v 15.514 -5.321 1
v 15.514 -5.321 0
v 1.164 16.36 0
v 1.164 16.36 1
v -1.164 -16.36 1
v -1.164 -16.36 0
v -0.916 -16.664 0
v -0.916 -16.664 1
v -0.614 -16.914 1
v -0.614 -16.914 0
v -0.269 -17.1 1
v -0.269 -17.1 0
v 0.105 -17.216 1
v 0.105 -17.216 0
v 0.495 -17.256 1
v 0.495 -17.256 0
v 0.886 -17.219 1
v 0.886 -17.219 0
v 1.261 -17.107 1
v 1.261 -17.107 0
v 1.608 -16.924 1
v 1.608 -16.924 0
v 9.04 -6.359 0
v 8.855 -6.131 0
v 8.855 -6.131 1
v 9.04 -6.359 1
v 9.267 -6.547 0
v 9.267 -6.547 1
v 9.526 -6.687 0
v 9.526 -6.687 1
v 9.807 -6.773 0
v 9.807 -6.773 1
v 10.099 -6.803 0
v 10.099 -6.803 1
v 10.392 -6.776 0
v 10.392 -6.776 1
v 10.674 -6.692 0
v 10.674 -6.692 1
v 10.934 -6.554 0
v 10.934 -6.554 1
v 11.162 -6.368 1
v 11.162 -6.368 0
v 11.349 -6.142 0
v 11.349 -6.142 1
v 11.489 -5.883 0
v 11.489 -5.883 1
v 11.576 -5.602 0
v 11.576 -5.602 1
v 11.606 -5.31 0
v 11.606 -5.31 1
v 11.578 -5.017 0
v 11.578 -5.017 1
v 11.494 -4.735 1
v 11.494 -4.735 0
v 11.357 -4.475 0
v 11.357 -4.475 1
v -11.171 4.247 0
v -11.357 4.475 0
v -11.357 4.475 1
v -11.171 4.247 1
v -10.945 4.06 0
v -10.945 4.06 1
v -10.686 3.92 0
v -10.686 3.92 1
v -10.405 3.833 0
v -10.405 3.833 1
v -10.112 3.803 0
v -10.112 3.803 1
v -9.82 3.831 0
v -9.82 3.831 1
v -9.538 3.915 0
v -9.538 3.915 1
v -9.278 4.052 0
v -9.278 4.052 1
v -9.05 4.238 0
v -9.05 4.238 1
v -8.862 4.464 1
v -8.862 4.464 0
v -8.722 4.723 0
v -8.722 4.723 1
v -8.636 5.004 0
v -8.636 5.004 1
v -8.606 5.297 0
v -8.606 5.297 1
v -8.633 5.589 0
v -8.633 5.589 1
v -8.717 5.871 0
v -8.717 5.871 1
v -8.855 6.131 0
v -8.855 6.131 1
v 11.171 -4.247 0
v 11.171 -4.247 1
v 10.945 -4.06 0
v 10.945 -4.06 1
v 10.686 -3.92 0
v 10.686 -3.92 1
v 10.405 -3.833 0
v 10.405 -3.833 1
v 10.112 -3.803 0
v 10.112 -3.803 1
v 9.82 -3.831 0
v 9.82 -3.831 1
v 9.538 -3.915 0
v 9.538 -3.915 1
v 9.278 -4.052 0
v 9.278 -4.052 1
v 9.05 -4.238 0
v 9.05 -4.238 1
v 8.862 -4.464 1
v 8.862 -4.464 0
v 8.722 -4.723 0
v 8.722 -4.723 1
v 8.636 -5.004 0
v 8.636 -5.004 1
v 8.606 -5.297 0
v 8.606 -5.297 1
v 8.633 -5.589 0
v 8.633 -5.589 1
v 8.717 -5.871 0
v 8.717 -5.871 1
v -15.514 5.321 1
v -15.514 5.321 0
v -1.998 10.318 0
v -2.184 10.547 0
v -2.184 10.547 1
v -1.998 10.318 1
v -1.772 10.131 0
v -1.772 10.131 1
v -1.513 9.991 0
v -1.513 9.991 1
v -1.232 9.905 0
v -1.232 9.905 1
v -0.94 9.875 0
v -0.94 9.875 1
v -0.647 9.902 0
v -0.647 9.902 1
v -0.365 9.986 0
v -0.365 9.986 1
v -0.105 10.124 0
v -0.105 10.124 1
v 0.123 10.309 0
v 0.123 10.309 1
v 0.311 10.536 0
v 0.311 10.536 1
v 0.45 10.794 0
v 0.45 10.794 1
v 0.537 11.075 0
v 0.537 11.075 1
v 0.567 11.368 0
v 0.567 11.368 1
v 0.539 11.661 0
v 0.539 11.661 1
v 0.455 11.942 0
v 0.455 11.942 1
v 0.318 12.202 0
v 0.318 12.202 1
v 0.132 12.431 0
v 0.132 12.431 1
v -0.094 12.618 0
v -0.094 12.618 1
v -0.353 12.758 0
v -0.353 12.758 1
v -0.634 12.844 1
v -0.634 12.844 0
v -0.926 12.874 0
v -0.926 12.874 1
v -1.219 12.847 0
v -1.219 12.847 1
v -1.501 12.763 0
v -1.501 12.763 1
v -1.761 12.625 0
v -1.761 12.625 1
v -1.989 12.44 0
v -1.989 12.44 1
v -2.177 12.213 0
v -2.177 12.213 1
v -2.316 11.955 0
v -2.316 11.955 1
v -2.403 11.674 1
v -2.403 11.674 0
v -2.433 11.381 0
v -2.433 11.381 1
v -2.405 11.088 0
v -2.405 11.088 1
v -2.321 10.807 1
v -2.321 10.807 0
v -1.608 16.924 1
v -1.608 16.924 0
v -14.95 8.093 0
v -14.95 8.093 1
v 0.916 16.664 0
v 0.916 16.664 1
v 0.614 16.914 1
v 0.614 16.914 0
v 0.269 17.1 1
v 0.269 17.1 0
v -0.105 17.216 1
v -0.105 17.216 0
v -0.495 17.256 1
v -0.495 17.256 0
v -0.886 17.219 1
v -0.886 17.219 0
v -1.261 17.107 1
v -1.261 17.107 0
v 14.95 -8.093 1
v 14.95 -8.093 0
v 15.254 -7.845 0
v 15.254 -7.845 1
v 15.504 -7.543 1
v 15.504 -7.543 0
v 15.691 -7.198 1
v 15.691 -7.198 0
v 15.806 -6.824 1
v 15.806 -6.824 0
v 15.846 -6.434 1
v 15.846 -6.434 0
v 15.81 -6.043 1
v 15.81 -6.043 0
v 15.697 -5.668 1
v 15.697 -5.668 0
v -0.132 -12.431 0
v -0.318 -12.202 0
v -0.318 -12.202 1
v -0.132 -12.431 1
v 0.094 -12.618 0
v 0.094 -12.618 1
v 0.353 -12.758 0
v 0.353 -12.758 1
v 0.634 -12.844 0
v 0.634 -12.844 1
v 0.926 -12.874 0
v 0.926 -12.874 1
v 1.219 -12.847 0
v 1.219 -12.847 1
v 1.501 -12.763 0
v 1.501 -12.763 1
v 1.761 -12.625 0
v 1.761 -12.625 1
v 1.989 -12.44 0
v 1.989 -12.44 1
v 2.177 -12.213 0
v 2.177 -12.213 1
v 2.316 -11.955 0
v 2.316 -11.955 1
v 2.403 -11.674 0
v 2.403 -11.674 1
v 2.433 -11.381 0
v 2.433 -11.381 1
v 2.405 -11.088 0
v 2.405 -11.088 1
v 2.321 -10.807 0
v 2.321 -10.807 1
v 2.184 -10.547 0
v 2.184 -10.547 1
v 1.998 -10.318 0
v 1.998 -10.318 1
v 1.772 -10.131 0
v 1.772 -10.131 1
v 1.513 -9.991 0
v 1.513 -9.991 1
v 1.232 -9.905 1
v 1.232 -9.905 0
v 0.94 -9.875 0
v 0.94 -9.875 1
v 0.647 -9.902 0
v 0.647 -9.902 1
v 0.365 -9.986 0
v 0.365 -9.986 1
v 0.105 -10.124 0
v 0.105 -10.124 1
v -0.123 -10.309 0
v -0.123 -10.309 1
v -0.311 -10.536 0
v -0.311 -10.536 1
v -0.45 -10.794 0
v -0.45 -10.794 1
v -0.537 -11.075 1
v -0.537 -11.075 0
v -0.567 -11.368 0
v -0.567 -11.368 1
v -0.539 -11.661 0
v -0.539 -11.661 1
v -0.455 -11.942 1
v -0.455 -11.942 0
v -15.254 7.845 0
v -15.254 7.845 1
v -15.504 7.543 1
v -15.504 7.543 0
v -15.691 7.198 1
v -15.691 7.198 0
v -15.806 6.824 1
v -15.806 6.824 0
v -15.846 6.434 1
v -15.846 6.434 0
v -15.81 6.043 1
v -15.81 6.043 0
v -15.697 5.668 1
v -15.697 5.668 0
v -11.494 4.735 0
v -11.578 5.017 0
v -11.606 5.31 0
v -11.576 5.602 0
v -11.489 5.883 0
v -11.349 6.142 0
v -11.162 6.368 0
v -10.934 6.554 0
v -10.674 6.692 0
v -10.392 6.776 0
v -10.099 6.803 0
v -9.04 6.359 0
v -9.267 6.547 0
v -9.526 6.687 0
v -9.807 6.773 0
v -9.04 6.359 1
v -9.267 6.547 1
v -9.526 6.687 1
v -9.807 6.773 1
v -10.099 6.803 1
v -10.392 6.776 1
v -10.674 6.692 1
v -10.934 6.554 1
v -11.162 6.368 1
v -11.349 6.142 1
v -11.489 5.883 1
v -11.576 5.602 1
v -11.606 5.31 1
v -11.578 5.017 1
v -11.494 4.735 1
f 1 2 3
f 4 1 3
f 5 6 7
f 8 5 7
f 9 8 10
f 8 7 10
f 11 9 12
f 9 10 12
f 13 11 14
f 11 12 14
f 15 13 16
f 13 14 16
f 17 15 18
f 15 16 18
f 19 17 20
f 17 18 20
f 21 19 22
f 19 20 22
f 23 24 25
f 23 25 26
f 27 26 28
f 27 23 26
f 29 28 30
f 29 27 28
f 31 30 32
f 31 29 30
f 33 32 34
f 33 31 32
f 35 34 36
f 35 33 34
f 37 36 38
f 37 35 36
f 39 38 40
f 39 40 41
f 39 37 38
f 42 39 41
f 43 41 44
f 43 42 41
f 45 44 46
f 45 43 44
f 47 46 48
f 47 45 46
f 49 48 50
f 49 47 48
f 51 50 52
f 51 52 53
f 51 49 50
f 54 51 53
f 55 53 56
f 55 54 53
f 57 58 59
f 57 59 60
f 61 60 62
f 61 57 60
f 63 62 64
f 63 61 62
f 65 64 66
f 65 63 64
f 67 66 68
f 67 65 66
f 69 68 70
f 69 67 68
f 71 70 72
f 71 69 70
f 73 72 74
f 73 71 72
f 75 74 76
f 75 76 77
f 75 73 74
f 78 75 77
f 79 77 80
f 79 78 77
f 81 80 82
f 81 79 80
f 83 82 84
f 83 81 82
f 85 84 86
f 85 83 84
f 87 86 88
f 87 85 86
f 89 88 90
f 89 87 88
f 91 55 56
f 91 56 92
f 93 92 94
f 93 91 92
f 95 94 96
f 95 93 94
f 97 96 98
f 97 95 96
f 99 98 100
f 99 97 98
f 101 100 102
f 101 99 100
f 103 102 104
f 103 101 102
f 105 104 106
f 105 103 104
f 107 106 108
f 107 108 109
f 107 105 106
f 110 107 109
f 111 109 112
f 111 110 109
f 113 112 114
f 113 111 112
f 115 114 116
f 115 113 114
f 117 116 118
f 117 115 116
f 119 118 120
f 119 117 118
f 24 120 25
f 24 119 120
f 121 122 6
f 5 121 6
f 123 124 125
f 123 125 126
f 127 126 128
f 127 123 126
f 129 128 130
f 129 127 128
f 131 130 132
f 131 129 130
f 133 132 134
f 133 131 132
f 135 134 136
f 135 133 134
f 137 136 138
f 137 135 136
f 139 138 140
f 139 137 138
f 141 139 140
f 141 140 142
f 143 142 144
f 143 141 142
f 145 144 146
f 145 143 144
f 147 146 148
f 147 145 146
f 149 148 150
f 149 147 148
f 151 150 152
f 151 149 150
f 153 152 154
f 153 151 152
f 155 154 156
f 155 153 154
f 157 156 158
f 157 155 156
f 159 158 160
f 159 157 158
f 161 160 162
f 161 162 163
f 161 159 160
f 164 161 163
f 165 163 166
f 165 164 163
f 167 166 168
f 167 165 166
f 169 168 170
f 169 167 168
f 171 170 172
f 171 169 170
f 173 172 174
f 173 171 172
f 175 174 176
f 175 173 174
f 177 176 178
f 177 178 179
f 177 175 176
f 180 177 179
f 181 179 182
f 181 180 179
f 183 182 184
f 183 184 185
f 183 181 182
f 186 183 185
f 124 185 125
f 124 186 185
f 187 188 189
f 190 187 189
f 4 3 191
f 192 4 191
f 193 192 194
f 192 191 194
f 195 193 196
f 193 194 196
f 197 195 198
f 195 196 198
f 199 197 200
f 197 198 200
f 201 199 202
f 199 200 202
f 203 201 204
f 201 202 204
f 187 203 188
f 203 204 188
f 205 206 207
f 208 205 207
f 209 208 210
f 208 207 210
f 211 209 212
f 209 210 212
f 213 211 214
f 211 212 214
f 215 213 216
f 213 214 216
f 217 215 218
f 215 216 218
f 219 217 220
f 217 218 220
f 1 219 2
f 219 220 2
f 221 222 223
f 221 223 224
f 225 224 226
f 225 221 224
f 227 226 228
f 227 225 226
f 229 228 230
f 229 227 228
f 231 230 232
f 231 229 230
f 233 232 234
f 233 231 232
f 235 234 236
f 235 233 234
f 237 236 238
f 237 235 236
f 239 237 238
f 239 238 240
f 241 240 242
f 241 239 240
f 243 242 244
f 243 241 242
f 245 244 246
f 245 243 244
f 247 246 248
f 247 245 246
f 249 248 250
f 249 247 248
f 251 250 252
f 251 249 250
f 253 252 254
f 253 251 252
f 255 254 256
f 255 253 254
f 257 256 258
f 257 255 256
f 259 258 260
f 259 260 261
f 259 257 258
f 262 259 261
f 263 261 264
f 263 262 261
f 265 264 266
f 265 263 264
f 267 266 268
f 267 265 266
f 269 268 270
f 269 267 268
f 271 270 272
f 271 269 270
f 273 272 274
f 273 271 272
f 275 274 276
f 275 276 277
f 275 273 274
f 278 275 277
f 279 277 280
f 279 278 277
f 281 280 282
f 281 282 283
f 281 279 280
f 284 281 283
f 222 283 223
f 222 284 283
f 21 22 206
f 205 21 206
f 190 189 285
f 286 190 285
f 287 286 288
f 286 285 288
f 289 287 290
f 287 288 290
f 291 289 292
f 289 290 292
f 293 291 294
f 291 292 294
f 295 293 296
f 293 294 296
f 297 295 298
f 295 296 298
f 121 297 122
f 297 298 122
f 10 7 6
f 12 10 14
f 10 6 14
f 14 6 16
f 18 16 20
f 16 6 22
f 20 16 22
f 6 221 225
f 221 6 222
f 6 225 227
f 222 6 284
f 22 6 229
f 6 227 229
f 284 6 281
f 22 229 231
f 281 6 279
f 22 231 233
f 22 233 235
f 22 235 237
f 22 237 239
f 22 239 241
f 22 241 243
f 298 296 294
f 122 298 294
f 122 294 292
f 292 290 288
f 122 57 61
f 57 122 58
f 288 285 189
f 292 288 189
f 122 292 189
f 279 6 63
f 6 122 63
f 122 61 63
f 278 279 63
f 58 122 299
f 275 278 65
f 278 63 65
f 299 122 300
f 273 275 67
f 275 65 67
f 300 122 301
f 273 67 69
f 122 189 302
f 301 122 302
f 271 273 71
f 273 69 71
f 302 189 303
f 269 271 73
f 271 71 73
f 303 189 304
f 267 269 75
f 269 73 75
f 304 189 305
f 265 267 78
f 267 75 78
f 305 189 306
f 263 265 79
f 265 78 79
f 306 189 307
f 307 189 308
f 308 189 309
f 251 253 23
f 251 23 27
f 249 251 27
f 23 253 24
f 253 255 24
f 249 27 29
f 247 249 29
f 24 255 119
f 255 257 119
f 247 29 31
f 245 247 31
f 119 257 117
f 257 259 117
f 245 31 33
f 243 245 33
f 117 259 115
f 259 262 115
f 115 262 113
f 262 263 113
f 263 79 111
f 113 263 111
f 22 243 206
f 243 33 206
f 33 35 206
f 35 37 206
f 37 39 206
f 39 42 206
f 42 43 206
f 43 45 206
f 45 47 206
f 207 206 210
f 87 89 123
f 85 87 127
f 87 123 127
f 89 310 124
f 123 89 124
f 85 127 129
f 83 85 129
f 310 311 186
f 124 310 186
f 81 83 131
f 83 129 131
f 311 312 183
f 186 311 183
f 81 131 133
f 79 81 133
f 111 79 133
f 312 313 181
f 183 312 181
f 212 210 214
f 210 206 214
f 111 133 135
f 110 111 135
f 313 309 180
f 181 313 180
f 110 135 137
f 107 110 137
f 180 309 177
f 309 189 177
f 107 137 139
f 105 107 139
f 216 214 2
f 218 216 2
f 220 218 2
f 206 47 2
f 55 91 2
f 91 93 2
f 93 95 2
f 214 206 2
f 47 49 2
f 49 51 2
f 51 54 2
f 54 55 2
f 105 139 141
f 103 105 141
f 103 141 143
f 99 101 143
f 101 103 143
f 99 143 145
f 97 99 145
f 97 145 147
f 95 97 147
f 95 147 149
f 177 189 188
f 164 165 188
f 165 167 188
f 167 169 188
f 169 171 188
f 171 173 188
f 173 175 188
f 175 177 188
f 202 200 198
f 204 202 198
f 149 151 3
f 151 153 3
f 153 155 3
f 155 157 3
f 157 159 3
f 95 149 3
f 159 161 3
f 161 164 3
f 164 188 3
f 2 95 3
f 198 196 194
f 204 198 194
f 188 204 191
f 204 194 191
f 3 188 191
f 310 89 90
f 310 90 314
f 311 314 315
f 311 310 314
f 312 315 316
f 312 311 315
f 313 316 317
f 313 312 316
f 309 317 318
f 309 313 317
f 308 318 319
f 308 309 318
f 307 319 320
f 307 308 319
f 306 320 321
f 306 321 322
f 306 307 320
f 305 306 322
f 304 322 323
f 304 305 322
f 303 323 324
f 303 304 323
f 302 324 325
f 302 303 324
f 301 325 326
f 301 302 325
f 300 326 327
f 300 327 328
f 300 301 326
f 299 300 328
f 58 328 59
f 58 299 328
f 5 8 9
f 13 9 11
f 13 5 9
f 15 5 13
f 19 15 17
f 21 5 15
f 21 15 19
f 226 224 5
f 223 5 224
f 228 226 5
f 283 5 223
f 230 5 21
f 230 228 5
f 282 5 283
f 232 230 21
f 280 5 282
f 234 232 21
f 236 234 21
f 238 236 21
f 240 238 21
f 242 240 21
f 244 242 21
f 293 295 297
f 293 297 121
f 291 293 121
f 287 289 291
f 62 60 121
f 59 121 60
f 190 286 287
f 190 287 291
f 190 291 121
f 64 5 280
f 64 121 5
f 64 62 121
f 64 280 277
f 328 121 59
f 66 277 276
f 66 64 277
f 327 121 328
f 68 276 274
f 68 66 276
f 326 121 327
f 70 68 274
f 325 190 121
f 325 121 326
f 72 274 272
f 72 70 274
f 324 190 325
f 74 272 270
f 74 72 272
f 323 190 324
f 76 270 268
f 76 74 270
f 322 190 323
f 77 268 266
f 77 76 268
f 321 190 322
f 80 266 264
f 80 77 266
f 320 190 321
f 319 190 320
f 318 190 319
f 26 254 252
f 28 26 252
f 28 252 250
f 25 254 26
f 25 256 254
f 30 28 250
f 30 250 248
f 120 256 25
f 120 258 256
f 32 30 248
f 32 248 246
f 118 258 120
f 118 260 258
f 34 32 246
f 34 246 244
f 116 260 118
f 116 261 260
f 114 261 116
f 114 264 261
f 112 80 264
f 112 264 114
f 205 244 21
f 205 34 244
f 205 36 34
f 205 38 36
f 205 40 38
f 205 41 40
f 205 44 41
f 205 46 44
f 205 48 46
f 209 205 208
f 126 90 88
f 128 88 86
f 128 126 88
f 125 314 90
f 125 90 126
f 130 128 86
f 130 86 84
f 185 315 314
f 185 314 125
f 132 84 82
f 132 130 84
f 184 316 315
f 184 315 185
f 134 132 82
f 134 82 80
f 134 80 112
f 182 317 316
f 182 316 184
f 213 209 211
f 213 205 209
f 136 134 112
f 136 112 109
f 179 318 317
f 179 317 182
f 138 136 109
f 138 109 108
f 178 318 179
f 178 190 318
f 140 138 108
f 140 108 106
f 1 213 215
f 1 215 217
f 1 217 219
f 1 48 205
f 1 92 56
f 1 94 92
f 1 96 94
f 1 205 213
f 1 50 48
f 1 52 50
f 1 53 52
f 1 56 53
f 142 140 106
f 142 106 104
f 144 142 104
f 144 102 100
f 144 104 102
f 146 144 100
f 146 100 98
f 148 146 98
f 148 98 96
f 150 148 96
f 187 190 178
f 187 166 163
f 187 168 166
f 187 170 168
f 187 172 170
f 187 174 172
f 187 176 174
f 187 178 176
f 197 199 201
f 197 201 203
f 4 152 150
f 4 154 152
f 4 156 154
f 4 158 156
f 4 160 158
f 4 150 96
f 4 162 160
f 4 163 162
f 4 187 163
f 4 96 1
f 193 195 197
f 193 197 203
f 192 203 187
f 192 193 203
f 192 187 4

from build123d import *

# Parameters (mm, degrees)
EXTRUDE_1_DEPTH = 1


with BuildPart() as part:
    # 草图1 → 凸台-拉伸1 (new body)
    with BuildSketch(Plane.XY):
        with BuildLine():
            Line((15.51403903, -5.321145834), (1.163677412, 16.35988554))
            ThreePointArc((1.163677412, 16.35988554), (-0.105358364, 17.215860979), (-1.607968203, 16.923783214))
            Line((-1.607968203, 16.923783214), (-14.950141356, 8.092791449))
            ThreePointArc((-14.950141356, 8.092791449), (-15.806116795, 6.823755673), (-15.51403903, 5.321145834))
            Line((-15.51403903, 5.321145834), (-1.163677412, -16.35988554))
            ThreePointArc((-1.163677412, -16.35988554), (0.105358364, -17.215860979), (1.607968203, -16.923783214))
            Line((1.607968203, -16.923783214), (14.950141356, -8.092791449))
            ThreePointArc((14.950141356, -8.092791449), (15.806116795, -6.823755673), (15.51403903, -5.321145834))
        make_face()
        with BuildLine():
            ThreePointArc((11.356570608, -4.475299323), (9.277836397, -4.052376068), (8.854913141, -6.131110279))
            ThreePointArc((8.854913141, -6.131110279), (10.933647352, -6.554033535), (11.356570608, -4.475299323))
        make_face(mode=Mode.SUBTRACT)
        with BuildLine():
            ThreePointArc((2.183826565, -10.546606162), (0.105092354, -10.123682907), (-0.317830901, -12.202417118))
            ThreePointArc((-0.317830901, -12.202417118), (1.76090331, -12.625340373), (2.183826565, -10.546606162))
        make_face(mode=Mode.SUBTRACT)
        with BuildLine():
            ThreePointArc((-8.854913141, 6.131110279), (-10.933647352, 6.554033535), (-11.356570608, 4.475299323))
            ThreePointArc((-11.356570608, 4.475299323), (-9.277836397, 4.052376068), (-8.854913141, 6.131110279))
        make_face(mode=Mode.SUBTRACT)
        with BuildLine():
            ThreePointArc((0.317830901, 12.202417118), (-1.76090331, 12.625340373), (-2.183826565, 10.546606162))
            ThreePointArc((-2.183826565, 10.546606162), (-0.105092354, 10.123682907), (0.317830901, 12.202417118))
        make_face(mode=Mode.SUBTRACT)
    extrude(amount=EXTRUDE_1_DEPTH)


solid = part.part
